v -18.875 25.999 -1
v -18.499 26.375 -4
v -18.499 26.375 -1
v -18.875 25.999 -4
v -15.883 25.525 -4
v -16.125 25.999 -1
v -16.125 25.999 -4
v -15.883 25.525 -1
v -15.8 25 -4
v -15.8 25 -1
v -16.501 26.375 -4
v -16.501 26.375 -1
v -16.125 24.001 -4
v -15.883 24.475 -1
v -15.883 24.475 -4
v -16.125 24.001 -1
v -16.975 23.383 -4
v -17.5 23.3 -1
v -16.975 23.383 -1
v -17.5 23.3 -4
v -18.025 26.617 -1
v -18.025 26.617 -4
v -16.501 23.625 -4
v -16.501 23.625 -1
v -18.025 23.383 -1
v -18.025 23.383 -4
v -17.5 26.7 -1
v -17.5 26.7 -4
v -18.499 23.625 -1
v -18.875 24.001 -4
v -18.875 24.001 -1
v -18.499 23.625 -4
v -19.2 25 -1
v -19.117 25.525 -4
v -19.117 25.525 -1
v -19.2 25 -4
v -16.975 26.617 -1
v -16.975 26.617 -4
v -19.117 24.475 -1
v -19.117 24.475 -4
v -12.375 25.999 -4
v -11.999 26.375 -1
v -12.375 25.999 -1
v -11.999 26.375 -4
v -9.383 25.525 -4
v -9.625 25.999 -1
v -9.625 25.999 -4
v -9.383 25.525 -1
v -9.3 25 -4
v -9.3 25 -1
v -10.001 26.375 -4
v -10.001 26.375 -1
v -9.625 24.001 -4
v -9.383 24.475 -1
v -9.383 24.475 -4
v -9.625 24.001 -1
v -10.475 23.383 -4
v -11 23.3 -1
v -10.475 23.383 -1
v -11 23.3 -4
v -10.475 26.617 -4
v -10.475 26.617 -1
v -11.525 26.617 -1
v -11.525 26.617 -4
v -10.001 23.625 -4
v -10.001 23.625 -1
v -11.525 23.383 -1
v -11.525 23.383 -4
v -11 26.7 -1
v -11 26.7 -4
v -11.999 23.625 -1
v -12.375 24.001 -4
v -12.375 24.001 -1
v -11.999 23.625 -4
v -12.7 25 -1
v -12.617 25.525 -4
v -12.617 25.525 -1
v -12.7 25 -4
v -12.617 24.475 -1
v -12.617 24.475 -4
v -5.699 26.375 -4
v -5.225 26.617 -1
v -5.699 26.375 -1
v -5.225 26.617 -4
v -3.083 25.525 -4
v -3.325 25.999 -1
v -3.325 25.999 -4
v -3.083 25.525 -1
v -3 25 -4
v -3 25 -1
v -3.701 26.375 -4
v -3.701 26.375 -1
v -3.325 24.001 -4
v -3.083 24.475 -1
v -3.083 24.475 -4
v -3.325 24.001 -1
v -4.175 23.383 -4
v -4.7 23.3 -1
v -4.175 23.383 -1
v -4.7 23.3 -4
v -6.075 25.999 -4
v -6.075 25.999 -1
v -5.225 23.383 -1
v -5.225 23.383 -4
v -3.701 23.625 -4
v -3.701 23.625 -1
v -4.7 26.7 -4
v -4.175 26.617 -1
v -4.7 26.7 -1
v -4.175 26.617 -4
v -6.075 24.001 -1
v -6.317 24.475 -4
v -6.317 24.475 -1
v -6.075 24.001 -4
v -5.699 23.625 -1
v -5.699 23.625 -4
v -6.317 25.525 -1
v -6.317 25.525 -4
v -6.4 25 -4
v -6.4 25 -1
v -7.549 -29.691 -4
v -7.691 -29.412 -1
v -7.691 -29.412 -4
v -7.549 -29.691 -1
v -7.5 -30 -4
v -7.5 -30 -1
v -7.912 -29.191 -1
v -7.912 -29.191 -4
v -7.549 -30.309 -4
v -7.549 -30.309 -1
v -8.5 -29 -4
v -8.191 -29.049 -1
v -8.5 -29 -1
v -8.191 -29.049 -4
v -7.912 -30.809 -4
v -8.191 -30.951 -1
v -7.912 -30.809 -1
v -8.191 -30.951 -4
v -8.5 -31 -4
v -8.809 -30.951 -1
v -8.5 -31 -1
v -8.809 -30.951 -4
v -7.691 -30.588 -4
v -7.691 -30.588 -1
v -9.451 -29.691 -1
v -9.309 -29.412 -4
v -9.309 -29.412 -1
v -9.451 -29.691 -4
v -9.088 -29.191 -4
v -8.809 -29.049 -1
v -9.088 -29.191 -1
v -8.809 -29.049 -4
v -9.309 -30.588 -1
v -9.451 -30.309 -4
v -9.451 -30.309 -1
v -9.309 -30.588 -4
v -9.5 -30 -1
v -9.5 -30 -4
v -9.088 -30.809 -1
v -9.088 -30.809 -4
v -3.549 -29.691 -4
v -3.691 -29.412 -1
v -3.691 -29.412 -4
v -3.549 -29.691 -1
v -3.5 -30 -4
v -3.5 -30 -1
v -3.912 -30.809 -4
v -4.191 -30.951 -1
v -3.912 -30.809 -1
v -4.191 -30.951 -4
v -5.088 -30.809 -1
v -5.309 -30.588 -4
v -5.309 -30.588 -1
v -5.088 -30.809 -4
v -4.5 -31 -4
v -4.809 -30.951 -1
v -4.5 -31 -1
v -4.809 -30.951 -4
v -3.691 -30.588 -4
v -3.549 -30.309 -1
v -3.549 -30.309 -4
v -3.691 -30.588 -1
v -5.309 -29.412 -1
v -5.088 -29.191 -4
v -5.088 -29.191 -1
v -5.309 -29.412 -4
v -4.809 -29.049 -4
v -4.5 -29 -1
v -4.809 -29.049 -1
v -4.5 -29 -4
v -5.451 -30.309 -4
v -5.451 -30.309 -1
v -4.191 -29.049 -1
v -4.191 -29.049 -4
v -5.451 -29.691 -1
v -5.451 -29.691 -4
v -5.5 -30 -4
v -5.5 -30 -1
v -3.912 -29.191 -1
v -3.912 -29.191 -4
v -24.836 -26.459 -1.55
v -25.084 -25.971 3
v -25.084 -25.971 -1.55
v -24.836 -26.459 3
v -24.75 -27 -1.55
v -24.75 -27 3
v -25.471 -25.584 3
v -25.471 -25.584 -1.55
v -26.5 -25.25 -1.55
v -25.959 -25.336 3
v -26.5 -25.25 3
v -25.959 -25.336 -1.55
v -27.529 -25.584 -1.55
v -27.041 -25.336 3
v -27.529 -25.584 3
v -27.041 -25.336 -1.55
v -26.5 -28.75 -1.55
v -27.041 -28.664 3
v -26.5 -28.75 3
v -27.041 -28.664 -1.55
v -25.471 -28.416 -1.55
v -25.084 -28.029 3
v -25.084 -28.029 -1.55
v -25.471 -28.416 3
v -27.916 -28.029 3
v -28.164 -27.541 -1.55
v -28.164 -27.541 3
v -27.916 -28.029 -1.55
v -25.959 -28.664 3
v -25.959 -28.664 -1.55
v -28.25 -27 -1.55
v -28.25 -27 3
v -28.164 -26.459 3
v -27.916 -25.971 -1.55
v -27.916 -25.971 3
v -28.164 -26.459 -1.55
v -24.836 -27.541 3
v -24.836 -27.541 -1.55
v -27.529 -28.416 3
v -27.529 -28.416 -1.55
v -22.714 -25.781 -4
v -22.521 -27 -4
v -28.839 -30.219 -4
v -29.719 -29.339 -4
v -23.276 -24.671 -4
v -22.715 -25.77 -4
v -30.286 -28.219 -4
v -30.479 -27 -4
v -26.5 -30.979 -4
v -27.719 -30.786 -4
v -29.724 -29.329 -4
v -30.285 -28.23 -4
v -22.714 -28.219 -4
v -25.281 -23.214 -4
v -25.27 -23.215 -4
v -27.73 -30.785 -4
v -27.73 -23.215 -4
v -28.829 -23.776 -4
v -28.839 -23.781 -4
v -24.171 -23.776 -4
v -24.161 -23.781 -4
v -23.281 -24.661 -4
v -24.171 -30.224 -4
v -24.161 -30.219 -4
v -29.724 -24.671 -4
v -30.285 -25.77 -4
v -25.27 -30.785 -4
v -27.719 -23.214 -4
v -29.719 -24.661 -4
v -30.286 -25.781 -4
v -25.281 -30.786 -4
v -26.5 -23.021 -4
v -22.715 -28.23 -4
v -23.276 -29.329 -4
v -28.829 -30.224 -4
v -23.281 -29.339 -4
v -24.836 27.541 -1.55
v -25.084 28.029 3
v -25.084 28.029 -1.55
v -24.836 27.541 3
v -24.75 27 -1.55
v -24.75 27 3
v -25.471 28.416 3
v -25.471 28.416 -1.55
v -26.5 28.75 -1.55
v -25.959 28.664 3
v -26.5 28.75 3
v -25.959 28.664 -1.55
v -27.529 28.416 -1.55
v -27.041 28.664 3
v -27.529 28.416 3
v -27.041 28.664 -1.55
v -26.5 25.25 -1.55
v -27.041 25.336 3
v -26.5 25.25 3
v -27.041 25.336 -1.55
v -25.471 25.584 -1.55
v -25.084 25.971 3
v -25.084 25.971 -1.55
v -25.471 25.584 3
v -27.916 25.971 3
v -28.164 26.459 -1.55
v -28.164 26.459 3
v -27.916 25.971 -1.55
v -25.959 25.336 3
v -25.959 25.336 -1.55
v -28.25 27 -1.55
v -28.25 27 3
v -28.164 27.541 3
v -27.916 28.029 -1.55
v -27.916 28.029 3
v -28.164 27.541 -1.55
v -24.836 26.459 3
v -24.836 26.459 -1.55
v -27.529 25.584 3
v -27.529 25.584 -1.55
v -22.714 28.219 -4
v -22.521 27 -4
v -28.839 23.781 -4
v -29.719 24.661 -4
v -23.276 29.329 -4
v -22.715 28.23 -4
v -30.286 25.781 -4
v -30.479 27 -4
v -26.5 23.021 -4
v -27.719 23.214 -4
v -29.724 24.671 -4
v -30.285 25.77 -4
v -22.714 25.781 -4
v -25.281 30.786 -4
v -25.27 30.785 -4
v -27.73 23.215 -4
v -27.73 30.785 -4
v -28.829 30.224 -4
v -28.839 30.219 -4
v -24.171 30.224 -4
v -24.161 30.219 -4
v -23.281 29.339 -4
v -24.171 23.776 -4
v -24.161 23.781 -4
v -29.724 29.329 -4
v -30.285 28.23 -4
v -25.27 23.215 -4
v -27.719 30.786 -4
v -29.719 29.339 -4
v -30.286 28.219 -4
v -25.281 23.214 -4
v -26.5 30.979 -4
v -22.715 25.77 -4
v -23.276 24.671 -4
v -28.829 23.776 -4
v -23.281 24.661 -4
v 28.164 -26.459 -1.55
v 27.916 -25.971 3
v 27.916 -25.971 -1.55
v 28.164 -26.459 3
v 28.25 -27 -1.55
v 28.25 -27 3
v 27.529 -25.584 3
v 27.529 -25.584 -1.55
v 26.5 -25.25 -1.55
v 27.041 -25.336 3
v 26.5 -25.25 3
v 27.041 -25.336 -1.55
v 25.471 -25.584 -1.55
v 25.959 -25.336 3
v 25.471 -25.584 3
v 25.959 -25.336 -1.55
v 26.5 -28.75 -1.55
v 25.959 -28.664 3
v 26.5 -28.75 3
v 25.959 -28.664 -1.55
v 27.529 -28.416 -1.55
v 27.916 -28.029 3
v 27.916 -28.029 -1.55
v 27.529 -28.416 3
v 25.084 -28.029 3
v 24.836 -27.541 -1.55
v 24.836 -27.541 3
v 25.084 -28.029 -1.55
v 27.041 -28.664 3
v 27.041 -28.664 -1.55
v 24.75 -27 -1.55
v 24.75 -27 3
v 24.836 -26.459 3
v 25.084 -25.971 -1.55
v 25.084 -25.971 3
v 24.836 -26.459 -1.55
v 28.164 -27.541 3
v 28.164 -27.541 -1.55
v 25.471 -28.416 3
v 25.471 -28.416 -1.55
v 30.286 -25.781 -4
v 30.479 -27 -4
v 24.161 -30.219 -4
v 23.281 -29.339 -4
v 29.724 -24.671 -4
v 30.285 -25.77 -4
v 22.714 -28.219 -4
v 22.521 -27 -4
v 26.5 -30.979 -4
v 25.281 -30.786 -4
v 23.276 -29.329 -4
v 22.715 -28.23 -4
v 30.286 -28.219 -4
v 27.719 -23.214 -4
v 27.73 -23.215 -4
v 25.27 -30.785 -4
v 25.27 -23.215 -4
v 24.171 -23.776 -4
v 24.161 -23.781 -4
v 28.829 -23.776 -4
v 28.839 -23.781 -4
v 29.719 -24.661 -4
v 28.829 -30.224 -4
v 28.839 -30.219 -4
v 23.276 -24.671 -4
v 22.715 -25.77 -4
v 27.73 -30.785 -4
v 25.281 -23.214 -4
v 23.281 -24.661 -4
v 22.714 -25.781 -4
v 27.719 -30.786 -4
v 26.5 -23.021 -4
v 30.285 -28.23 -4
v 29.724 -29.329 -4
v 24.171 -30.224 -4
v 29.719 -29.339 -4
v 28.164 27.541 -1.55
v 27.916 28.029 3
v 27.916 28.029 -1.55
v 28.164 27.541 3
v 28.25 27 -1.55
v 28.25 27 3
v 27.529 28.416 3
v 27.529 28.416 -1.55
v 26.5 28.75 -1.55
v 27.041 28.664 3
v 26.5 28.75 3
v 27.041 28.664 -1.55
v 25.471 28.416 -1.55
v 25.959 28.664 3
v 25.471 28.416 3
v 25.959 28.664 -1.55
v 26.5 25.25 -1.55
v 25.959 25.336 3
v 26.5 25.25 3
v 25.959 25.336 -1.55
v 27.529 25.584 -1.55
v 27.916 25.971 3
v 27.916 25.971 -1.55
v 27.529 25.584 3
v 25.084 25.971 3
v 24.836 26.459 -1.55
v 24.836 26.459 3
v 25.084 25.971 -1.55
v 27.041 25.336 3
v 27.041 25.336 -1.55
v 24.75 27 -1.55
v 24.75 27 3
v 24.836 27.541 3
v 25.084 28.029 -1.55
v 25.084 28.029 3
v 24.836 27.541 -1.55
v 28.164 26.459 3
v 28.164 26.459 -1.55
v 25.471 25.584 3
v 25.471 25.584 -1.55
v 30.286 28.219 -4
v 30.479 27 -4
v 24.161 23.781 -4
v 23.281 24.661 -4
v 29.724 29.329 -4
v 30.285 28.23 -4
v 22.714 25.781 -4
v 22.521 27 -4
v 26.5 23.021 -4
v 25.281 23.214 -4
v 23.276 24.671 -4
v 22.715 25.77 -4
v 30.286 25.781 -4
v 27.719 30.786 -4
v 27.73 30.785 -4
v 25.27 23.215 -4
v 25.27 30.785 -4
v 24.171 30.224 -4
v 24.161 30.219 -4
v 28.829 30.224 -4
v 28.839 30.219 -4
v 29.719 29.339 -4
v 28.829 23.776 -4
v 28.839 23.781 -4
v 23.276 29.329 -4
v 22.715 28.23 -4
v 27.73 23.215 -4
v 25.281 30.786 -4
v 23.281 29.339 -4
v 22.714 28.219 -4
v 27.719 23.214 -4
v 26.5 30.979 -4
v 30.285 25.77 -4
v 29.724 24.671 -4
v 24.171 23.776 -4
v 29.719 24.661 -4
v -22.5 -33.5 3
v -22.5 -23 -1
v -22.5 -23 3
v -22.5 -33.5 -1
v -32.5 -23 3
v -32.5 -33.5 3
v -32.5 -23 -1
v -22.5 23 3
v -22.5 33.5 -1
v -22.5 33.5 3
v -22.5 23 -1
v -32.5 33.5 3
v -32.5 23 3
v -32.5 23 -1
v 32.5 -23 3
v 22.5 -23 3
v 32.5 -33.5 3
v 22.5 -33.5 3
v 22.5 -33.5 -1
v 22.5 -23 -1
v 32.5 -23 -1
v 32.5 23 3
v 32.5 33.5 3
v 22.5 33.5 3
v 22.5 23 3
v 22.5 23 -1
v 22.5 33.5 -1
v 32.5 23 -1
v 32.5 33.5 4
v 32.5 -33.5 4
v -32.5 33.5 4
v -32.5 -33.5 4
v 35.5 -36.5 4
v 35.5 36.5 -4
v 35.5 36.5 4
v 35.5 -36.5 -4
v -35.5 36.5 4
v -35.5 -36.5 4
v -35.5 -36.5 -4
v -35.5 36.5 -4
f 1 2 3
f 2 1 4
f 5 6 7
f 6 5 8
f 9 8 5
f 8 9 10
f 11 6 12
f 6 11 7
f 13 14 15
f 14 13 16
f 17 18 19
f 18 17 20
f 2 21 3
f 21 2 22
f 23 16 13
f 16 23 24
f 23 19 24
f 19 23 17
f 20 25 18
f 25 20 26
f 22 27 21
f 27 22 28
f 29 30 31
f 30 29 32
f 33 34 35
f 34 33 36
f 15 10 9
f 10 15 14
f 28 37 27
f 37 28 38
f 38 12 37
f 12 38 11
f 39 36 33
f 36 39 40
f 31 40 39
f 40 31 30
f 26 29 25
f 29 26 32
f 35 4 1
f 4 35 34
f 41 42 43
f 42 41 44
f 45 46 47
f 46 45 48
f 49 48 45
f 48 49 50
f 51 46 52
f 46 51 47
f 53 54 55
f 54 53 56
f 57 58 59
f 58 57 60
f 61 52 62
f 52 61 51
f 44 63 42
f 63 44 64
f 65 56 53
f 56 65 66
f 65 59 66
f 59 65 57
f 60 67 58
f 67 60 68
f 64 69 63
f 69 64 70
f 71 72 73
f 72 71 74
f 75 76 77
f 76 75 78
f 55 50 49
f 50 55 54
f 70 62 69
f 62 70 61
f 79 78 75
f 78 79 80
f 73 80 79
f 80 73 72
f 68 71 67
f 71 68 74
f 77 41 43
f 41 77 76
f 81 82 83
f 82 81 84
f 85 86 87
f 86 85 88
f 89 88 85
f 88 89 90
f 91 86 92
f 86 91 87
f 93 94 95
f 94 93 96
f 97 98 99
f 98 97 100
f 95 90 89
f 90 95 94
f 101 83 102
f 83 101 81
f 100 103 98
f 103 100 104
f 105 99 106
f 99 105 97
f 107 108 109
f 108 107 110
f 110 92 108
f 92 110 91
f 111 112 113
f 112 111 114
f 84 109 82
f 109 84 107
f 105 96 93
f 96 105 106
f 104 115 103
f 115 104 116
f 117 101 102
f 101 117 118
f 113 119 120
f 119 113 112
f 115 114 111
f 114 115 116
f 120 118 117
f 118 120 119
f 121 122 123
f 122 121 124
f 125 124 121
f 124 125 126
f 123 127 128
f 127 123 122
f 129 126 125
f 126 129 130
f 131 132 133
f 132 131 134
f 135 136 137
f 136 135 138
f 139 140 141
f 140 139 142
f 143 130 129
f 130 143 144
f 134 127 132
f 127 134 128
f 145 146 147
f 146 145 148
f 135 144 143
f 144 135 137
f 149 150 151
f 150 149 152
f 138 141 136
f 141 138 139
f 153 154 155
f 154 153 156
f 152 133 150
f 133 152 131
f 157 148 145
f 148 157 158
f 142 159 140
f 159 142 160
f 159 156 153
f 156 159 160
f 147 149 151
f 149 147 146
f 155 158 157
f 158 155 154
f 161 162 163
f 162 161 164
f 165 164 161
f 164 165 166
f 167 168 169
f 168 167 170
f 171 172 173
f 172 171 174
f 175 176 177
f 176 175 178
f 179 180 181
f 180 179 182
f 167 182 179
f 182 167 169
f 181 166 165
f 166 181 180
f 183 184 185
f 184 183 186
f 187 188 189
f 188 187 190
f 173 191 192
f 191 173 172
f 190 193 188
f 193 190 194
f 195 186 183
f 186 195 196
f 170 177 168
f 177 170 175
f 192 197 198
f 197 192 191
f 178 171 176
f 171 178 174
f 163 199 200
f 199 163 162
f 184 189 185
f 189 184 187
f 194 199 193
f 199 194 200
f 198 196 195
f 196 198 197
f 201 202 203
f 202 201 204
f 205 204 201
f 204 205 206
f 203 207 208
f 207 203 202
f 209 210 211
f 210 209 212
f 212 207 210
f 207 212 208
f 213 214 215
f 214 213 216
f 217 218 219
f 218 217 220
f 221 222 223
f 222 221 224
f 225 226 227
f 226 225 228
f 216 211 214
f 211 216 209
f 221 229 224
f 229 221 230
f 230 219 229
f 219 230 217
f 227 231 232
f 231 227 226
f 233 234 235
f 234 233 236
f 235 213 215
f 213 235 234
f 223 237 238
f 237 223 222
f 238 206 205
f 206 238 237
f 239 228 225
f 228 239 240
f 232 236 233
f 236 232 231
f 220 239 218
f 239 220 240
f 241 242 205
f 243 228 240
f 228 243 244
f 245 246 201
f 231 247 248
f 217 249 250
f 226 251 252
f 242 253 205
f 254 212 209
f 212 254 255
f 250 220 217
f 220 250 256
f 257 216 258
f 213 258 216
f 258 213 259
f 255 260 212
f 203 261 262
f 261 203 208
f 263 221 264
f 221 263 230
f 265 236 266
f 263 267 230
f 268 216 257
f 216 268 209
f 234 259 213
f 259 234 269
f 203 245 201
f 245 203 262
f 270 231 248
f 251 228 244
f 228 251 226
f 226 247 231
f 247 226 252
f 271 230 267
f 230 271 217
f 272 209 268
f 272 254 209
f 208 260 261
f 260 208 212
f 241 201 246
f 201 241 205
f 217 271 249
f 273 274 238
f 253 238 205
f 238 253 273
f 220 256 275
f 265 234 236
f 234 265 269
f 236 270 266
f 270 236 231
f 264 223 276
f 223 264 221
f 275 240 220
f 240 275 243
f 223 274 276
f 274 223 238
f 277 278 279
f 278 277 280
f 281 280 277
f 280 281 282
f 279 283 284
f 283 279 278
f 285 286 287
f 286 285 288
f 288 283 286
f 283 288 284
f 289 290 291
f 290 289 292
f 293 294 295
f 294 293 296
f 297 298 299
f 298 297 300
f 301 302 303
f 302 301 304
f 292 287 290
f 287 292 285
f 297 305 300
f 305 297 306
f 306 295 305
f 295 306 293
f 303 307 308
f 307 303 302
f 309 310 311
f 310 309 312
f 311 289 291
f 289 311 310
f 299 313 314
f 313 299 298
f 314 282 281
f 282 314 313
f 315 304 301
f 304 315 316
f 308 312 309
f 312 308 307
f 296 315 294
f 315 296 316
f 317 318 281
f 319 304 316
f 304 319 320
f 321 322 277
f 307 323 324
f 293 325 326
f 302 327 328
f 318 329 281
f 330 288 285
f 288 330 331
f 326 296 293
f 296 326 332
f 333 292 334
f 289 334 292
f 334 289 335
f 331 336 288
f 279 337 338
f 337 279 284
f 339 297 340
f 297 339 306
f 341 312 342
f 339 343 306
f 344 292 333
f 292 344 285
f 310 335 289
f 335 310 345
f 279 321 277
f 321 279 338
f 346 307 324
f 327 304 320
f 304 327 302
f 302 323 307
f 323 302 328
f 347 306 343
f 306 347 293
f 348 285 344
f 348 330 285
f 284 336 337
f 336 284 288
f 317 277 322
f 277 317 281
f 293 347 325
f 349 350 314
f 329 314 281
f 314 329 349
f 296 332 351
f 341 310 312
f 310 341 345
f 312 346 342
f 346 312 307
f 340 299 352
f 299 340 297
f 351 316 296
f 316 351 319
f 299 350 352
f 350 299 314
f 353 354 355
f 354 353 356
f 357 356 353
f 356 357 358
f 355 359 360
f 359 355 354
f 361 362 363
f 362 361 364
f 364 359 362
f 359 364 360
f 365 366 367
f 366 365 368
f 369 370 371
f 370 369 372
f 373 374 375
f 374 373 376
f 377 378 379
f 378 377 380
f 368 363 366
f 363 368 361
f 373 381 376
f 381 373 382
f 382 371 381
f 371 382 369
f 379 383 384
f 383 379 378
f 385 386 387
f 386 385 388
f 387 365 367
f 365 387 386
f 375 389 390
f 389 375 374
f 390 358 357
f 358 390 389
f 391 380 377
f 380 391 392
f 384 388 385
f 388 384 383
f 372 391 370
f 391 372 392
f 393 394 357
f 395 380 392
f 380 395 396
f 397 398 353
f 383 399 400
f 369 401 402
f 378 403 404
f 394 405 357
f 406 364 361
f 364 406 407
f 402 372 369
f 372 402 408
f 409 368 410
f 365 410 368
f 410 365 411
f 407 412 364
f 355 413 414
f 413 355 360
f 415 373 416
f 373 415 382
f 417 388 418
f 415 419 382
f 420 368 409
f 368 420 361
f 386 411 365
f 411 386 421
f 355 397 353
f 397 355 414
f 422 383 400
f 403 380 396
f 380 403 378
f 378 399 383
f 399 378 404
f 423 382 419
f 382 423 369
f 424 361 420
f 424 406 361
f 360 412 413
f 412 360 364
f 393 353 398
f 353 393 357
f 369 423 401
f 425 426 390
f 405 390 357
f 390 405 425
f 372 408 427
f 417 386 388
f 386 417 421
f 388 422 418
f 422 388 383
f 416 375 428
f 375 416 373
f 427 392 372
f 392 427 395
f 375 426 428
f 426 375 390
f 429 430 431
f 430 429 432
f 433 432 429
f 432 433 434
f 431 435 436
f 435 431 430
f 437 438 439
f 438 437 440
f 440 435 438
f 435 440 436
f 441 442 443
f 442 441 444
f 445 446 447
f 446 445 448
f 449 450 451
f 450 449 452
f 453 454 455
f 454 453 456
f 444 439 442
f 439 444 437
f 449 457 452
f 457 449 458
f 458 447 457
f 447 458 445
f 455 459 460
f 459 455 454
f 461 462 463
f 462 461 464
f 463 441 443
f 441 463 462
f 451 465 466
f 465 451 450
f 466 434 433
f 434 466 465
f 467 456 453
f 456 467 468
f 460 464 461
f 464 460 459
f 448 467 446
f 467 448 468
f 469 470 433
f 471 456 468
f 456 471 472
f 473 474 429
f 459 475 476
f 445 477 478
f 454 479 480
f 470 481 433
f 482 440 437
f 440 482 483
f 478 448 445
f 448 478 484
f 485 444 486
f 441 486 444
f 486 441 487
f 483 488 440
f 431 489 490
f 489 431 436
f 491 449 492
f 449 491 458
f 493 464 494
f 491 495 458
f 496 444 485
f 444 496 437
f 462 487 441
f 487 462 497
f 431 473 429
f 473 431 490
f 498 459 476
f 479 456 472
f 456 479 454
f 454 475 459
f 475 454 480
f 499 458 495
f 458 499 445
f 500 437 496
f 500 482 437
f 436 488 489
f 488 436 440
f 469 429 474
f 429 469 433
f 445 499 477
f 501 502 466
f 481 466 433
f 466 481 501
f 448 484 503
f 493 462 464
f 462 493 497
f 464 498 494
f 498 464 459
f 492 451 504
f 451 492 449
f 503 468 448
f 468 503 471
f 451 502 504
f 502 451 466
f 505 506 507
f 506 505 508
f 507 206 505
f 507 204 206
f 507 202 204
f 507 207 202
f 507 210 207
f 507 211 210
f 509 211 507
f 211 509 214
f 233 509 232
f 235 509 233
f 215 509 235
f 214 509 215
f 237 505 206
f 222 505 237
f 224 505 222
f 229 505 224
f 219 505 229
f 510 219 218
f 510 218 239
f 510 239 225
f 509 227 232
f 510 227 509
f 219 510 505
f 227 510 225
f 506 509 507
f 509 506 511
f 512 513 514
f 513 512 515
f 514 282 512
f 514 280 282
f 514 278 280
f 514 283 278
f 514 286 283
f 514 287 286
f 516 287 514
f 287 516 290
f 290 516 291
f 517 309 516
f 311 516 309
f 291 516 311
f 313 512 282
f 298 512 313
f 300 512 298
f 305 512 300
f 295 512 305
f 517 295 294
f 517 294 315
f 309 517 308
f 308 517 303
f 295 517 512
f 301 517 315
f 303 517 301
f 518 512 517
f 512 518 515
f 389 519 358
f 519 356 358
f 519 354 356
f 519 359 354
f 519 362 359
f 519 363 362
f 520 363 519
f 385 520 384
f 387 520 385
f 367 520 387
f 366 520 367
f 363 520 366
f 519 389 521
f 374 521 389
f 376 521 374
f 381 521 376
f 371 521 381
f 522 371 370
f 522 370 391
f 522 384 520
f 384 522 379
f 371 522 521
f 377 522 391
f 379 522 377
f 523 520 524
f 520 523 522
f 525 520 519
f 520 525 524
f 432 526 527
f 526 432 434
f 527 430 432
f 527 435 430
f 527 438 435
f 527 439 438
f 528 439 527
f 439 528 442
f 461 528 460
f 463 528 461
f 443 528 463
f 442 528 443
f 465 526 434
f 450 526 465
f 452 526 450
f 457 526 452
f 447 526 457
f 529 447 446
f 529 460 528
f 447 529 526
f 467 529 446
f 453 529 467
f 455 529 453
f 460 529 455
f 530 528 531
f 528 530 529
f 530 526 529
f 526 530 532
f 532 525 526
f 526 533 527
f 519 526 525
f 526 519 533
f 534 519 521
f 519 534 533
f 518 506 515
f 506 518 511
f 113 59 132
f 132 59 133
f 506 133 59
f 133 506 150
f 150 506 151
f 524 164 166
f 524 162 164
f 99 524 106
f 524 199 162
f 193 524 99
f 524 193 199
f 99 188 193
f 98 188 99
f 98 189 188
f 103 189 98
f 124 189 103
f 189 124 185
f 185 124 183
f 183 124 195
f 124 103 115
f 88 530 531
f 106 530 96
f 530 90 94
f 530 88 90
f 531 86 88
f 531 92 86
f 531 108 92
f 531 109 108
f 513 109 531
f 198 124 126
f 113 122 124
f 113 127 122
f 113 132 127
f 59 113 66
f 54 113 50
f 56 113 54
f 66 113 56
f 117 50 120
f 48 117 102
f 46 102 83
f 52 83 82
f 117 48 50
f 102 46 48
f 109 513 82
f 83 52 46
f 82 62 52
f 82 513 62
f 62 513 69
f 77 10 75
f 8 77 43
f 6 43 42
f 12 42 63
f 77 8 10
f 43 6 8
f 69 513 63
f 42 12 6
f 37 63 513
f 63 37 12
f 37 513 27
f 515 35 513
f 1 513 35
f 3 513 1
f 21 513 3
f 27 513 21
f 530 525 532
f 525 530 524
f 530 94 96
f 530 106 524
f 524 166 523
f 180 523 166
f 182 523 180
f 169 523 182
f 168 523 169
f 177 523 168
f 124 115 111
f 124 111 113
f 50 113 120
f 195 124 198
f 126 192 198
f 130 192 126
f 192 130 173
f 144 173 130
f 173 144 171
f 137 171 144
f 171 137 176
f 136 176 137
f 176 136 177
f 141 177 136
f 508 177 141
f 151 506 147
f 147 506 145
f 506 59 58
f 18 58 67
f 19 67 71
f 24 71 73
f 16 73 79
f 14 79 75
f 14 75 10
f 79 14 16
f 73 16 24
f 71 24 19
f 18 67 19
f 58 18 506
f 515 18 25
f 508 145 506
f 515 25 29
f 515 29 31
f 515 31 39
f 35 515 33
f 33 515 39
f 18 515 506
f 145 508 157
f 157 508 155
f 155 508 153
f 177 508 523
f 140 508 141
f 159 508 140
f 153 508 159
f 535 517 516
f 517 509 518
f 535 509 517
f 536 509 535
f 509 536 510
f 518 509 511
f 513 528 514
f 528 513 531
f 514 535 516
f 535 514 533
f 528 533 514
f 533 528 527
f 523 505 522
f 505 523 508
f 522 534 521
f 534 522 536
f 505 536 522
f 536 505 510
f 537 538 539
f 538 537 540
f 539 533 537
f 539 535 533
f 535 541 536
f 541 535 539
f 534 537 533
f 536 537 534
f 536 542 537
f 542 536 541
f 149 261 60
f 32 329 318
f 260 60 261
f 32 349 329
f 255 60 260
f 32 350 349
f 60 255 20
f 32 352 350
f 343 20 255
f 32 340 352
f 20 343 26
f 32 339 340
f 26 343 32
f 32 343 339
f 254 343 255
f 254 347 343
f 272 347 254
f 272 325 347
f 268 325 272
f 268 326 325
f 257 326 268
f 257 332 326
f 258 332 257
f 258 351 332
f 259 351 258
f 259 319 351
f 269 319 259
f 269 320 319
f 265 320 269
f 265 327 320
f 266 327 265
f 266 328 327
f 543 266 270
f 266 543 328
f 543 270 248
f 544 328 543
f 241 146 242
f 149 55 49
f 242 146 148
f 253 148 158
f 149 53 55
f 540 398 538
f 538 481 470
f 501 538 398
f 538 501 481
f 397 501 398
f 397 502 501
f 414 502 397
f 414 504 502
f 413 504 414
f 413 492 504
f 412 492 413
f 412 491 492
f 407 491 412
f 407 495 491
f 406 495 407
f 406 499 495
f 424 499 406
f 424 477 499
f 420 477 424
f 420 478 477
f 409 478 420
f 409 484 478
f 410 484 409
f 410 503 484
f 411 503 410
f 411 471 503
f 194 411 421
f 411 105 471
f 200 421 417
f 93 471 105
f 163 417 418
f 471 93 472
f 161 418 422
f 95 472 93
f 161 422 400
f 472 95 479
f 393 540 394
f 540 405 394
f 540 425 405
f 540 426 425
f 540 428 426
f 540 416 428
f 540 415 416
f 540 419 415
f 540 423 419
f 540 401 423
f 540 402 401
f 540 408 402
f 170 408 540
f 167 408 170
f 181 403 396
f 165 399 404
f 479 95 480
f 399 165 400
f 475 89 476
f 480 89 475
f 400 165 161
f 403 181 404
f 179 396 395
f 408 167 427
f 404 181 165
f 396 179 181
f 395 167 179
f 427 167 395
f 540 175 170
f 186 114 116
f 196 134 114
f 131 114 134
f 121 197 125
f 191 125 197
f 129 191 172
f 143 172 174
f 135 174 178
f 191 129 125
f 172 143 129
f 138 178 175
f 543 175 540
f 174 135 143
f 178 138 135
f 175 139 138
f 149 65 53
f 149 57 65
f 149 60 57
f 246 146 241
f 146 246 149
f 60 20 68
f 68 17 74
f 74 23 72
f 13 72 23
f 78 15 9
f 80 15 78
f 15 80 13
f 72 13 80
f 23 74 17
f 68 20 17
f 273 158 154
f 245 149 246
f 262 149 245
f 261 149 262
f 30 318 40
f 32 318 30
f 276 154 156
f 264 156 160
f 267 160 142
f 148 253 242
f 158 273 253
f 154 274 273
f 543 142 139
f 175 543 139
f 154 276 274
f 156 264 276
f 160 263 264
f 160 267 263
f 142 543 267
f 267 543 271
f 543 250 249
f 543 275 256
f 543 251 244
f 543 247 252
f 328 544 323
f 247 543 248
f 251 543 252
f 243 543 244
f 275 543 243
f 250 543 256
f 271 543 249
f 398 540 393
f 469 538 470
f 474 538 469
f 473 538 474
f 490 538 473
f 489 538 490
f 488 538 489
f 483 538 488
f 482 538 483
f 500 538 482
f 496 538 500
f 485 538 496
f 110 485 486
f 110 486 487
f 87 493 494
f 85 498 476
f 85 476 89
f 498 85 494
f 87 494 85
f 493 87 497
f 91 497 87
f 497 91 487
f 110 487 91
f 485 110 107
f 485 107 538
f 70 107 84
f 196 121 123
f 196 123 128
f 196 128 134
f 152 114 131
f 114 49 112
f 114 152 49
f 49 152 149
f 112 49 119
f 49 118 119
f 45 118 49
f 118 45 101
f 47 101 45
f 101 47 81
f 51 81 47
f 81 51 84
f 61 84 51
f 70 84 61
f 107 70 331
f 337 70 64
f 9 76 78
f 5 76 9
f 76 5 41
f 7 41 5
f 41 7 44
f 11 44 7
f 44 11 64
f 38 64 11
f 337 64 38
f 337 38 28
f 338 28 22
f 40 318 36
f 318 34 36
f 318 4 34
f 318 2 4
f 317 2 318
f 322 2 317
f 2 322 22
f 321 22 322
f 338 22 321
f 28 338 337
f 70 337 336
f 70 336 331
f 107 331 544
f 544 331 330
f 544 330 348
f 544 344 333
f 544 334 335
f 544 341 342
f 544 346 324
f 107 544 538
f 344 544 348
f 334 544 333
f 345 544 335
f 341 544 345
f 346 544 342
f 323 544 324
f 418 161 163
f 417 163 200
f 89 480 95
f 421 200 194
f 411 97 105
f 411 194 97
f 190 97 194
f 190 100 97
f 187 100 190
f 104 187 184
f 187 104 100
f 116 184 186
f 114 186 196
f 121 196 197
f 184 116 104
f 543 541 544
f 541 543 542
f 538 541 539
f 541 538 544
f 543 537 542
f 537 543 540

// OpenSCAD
xcen = 53;
ycen = 54;
dia = 3.5;
thick=8;
lid=true;

case();



module slot()
{
	translate([dia,0,0])
		cylinder(r=dia/2,h=60, center=true,$fn=20);
	translate([-dia,0,0])
		cylinder(r=dia/2,h=60, center=true,$fn=20);
	cube([2*dia,dia,60],center=true);	
}

module corner(box, rr)
{
	for(x=[-1,1])for(y=[-1,1])
		translate([x*xcen/2,y*ycen/2,0])
		{
			if(box)
			{
				translate([2*x,2*y,-1])
					cube([12,12,thick], center=true);
			} else
			{
				cylinder(r=rr, h=40, center=true, $fn=20);
				if(lid)
				{
				translate([0,0,-thick/4-0.8])
				cylinder(r1=2.3*rr, r2=rr, h=2.5, center=true, $fn=20);
				}
			}
		}
}

module case()
{
difference()
{

	cube([71,73,thick], center=true);


	if(lid)
	{
		translate([-xcen/2,ycen/2,0])
		{
			translate([9,-2,0])
				cylinder(r=1.7, h=40, center=true, $fn=20);
			translate([9+6.5,-2,0])
			cylinder(r=1.7, h=40, center=true, $fn=20);
			translate([9+6.5+6.3,-2,0])
			cylinder(r=1.7, h=40, center=true, $fn=20);
		}
		translate([20-xcen/2,-ycen/2-3,0])
		{
			translate([-2,0,0])
					cylinder(r=1, h=40, center=true, $fn=20);
			translate([2,0,0])
			cylinder(r=1, h=40, center=true, $fn=20);
		}
		corner(box=false, rr=dia/2);
	} else
	{
		translate([xcen/2,-ycen/2,12.5-1-4])
		{
			translate([-30,-2,0])
				rotate([90,0,0])
					cylinder(r=2.5, h=40, center=true, $fn=20);

			translate([-30+10+10,-2,0])
				rotate([90,0,0])
					cylinder(r=2.5, h=40, center=true, $fn=20);
		}

		translate([-xcen/2,ycen/2,12.5-14])
					translate([30-10,-2,0])
				rotate([90,0,0])
					cylinder(r=1, h=40, center=true, $fn=20);

		translate([xcen/4,-ycen/4,0])
			slot();
		translate([-xcen/4,ycen/4,0])
			rotate([0,0,90])
				slot();
		corner(box=false, rr=0.8*dia/2);
	}



	difference()
	{
		translate([0,0,3])
		cube([65,67,thick], center=true, r=dia/2);
		corner(box=true, rr=dia/2);
	}

}

}
